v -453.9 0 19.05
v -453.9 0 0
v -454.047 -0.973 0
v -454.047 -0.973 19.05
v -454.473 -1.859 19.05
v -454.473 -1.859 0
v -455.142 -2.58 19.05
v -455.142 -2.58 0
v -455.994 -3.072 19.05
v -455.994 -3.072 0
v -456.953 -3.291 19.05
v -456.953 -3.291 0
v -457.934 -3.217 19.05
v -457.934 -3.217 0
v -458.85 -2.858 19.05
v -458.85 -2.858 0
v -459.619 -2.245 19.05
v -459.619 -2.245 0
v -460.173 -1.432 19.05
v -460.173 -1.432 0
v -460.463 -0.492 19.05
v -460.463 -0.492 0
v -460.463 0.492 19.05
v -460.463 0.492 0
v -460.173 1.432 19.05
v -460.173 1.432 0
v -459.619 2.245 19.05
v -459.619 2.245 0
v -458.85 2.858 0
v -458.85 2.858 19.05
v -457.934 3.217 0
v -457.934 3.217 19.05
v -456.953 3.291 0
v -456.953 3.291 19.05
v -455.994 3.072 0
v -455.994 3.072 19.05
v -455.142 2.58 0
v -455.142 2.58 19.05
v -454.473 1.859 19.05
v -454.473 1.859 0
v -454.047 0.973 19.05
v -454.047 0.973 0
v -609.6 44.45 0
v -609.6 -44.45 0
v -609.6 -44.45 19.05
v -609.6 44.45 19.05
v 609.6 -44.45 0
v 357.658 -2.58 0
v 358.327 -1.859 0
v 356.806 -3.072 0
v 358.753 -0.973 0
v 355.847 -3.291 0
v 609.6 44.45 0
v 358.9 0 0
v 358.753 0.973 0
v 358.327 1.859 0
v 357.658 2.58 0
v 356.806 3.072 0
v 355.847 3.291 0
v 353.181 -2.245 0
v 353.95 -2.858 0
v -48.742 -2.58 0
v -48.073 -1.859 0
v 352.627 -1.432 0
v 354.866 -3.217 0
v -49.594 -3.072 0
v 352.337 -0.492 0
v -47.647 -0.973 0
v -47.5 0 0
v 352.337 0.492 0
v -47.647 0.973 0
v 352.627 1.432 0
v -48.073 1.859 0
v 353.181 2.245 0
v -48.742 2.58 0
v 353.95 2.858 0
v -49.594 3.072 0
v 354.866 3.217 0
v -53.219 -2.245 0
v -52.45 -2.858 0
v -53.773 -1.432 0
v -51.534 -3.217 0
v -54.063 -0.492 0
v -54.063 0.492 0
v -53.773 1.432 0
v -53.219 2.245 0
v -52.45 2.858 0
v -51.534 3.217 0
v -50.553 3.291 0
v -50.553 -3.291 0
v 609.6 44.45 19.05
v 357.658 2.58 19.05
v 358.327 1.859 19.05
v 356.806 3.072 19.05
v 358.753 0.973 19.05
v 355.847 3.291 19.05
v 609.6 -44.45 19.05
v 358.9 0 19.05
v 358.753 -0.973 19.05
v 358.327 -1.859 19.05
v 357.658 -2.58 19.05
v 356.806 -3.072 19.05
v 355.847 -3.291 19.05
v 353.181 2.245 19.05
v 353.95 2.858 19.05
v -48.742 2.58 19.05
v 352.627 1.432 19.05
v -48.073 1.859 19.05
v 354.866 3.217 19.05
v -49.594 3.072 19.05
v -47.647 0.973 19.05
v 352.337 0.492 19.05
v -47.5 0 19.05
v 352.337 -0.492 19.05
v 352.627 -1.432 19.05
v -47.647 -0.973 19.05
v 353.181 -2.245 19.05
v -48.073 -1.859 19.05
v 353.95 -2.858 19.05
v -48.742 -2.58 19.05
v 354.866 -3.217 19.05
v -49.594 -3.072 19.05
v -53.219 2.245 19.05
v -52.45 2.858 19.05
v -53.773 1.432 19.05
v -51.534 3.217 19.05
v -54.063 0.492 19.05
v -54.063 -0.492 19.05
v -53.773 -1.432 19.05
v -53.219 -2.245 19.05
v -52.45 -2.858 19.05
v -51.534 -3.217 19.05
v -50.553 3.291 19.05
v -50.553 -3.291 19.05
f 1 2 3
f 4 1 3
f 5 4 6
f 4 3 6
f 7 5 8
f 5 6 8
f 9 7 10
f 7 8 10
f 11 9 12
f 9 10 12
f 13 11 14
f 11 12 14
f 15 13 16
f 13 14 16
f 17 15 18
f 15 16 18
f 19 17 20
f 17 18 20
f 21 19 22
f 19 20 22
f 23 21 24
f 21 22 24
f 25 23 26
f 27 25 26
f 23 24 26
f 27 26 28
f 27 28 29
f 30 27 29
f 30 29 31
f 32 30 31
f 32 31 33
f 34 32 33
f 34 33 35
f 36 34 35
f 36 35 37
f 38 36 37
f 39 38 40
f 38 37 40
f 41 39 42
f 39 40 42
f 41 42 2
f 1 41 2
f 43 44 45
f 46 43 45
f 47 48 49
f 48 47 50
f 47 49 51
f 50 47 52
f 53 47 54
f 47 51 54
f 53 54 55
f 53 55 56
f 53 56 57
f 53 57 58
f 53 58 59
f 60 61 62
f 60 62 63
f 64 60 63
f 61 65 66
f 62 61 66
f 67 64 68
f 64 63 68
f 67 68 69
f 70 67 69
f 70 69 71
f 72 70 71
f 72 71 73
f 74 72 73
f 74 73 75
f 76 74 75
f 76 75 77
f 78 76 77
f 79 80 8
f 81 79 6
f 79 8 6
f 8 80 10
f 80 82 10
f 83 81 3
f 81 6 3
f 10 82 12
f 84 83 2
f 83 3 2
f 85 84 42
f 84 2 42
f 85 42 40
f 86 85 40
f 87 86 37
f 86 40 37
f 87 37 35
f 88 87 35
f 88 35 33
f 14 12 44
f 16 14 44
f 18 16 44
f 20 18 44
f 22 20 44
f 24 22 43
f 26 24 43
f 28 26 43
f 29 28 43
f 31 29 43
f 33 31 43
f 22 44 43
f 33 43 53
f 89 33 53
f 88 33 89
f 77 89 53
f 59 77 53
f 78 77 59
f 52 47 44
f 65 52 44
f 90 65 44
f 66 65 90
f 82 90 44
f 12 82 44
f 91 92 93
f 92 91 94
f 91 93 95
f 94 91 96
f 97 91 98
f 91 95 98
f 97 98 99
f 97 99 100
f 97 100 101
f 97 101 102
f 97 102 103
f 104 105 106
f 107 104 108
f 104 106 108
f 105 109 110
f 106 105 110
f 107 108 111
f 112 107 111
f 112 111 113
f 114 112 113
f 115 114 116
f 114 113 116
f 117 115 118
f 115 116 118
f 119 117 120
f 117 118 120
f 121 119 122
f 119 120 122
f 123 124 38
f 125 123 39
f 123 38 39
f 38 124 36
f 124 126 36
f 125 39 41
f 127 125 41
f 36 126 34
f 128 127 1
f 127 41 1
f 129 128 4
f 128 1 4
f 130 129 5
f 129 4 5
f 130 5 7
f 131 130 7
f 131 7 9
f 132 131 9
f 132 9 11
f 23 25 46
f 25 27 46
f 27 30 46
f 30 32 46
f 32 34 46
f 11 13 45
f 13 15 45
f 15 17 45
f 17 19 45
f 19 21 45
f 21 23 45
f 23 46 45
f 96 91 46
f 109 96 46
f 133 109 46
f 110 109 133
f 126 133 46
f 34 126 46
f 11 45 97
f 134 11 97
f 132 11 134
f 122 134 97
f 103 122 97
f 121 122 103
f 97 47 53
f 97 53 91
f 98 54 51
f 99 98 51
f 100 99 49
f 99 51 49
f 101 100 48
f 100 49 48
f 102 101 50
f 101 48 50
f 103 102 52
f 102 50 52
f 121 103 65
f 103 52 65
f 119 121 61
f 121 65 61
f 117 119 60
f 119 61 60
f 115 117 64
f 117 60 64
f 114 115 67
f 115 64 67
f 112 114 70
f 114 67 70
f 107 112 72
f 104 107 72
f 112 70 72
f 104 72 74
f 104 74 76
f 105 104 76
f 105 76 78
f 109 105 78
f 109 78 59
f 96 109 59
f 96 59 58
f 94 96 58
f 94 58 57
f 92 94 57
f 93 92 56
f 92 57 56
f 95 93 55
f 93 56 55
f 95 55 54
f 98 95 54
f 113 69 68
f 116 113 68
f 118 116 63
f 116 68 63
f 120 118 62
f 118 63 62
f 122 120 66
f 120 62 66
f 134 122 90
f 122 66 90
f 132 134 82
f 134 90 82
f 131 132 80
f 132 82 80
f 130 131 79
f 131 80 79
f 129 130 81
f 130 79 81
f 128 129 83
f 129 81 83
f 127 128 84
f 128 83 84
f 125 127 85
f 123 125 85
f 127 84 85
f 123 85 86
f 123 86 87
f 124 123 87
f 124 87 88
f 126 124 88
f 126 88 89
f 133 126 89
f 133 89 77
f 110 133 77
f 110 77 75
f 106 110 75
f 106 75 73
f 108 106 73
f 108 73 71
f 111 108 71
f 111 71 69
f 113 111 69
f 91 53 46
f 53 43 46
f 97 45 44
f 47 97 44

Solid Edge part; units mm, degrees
sketch "Sketch1" plane through (0, 0, 0) normal (1, 0, 0) x (0, 1, 0)
  line L0 (-44.45, 0) -> (44.45, 0)
  line L1 (44.45, 0) -> (44.45, 19.05)
  line L2 (44.45, 19.05) -> (-44.45, 19.05)
  line L3 (-44.45, 19.05) -> (-44.45, 0)
  dimension "D1" = 88.9
  dimension "D2" = 19.05
extrude "Protrusion1" add sketch "Sketch1" along normal mid plane 1219.2
sketch "Sketch2" plane through (0, 0, 0) normal (0, 0, -1) x (1, 0, 0)
  circle A0 centre (-457.2, 0) radius 3.3
  dimension "D1" = 6.6
  dimension "D2" = 152.4
extrude "Cutout1" cut sketch "Sketch2" against normal through all
pattern_linear "Pattern1" count 3 spacing 406.4 along (1, 0, 0) of "Cutout1"
